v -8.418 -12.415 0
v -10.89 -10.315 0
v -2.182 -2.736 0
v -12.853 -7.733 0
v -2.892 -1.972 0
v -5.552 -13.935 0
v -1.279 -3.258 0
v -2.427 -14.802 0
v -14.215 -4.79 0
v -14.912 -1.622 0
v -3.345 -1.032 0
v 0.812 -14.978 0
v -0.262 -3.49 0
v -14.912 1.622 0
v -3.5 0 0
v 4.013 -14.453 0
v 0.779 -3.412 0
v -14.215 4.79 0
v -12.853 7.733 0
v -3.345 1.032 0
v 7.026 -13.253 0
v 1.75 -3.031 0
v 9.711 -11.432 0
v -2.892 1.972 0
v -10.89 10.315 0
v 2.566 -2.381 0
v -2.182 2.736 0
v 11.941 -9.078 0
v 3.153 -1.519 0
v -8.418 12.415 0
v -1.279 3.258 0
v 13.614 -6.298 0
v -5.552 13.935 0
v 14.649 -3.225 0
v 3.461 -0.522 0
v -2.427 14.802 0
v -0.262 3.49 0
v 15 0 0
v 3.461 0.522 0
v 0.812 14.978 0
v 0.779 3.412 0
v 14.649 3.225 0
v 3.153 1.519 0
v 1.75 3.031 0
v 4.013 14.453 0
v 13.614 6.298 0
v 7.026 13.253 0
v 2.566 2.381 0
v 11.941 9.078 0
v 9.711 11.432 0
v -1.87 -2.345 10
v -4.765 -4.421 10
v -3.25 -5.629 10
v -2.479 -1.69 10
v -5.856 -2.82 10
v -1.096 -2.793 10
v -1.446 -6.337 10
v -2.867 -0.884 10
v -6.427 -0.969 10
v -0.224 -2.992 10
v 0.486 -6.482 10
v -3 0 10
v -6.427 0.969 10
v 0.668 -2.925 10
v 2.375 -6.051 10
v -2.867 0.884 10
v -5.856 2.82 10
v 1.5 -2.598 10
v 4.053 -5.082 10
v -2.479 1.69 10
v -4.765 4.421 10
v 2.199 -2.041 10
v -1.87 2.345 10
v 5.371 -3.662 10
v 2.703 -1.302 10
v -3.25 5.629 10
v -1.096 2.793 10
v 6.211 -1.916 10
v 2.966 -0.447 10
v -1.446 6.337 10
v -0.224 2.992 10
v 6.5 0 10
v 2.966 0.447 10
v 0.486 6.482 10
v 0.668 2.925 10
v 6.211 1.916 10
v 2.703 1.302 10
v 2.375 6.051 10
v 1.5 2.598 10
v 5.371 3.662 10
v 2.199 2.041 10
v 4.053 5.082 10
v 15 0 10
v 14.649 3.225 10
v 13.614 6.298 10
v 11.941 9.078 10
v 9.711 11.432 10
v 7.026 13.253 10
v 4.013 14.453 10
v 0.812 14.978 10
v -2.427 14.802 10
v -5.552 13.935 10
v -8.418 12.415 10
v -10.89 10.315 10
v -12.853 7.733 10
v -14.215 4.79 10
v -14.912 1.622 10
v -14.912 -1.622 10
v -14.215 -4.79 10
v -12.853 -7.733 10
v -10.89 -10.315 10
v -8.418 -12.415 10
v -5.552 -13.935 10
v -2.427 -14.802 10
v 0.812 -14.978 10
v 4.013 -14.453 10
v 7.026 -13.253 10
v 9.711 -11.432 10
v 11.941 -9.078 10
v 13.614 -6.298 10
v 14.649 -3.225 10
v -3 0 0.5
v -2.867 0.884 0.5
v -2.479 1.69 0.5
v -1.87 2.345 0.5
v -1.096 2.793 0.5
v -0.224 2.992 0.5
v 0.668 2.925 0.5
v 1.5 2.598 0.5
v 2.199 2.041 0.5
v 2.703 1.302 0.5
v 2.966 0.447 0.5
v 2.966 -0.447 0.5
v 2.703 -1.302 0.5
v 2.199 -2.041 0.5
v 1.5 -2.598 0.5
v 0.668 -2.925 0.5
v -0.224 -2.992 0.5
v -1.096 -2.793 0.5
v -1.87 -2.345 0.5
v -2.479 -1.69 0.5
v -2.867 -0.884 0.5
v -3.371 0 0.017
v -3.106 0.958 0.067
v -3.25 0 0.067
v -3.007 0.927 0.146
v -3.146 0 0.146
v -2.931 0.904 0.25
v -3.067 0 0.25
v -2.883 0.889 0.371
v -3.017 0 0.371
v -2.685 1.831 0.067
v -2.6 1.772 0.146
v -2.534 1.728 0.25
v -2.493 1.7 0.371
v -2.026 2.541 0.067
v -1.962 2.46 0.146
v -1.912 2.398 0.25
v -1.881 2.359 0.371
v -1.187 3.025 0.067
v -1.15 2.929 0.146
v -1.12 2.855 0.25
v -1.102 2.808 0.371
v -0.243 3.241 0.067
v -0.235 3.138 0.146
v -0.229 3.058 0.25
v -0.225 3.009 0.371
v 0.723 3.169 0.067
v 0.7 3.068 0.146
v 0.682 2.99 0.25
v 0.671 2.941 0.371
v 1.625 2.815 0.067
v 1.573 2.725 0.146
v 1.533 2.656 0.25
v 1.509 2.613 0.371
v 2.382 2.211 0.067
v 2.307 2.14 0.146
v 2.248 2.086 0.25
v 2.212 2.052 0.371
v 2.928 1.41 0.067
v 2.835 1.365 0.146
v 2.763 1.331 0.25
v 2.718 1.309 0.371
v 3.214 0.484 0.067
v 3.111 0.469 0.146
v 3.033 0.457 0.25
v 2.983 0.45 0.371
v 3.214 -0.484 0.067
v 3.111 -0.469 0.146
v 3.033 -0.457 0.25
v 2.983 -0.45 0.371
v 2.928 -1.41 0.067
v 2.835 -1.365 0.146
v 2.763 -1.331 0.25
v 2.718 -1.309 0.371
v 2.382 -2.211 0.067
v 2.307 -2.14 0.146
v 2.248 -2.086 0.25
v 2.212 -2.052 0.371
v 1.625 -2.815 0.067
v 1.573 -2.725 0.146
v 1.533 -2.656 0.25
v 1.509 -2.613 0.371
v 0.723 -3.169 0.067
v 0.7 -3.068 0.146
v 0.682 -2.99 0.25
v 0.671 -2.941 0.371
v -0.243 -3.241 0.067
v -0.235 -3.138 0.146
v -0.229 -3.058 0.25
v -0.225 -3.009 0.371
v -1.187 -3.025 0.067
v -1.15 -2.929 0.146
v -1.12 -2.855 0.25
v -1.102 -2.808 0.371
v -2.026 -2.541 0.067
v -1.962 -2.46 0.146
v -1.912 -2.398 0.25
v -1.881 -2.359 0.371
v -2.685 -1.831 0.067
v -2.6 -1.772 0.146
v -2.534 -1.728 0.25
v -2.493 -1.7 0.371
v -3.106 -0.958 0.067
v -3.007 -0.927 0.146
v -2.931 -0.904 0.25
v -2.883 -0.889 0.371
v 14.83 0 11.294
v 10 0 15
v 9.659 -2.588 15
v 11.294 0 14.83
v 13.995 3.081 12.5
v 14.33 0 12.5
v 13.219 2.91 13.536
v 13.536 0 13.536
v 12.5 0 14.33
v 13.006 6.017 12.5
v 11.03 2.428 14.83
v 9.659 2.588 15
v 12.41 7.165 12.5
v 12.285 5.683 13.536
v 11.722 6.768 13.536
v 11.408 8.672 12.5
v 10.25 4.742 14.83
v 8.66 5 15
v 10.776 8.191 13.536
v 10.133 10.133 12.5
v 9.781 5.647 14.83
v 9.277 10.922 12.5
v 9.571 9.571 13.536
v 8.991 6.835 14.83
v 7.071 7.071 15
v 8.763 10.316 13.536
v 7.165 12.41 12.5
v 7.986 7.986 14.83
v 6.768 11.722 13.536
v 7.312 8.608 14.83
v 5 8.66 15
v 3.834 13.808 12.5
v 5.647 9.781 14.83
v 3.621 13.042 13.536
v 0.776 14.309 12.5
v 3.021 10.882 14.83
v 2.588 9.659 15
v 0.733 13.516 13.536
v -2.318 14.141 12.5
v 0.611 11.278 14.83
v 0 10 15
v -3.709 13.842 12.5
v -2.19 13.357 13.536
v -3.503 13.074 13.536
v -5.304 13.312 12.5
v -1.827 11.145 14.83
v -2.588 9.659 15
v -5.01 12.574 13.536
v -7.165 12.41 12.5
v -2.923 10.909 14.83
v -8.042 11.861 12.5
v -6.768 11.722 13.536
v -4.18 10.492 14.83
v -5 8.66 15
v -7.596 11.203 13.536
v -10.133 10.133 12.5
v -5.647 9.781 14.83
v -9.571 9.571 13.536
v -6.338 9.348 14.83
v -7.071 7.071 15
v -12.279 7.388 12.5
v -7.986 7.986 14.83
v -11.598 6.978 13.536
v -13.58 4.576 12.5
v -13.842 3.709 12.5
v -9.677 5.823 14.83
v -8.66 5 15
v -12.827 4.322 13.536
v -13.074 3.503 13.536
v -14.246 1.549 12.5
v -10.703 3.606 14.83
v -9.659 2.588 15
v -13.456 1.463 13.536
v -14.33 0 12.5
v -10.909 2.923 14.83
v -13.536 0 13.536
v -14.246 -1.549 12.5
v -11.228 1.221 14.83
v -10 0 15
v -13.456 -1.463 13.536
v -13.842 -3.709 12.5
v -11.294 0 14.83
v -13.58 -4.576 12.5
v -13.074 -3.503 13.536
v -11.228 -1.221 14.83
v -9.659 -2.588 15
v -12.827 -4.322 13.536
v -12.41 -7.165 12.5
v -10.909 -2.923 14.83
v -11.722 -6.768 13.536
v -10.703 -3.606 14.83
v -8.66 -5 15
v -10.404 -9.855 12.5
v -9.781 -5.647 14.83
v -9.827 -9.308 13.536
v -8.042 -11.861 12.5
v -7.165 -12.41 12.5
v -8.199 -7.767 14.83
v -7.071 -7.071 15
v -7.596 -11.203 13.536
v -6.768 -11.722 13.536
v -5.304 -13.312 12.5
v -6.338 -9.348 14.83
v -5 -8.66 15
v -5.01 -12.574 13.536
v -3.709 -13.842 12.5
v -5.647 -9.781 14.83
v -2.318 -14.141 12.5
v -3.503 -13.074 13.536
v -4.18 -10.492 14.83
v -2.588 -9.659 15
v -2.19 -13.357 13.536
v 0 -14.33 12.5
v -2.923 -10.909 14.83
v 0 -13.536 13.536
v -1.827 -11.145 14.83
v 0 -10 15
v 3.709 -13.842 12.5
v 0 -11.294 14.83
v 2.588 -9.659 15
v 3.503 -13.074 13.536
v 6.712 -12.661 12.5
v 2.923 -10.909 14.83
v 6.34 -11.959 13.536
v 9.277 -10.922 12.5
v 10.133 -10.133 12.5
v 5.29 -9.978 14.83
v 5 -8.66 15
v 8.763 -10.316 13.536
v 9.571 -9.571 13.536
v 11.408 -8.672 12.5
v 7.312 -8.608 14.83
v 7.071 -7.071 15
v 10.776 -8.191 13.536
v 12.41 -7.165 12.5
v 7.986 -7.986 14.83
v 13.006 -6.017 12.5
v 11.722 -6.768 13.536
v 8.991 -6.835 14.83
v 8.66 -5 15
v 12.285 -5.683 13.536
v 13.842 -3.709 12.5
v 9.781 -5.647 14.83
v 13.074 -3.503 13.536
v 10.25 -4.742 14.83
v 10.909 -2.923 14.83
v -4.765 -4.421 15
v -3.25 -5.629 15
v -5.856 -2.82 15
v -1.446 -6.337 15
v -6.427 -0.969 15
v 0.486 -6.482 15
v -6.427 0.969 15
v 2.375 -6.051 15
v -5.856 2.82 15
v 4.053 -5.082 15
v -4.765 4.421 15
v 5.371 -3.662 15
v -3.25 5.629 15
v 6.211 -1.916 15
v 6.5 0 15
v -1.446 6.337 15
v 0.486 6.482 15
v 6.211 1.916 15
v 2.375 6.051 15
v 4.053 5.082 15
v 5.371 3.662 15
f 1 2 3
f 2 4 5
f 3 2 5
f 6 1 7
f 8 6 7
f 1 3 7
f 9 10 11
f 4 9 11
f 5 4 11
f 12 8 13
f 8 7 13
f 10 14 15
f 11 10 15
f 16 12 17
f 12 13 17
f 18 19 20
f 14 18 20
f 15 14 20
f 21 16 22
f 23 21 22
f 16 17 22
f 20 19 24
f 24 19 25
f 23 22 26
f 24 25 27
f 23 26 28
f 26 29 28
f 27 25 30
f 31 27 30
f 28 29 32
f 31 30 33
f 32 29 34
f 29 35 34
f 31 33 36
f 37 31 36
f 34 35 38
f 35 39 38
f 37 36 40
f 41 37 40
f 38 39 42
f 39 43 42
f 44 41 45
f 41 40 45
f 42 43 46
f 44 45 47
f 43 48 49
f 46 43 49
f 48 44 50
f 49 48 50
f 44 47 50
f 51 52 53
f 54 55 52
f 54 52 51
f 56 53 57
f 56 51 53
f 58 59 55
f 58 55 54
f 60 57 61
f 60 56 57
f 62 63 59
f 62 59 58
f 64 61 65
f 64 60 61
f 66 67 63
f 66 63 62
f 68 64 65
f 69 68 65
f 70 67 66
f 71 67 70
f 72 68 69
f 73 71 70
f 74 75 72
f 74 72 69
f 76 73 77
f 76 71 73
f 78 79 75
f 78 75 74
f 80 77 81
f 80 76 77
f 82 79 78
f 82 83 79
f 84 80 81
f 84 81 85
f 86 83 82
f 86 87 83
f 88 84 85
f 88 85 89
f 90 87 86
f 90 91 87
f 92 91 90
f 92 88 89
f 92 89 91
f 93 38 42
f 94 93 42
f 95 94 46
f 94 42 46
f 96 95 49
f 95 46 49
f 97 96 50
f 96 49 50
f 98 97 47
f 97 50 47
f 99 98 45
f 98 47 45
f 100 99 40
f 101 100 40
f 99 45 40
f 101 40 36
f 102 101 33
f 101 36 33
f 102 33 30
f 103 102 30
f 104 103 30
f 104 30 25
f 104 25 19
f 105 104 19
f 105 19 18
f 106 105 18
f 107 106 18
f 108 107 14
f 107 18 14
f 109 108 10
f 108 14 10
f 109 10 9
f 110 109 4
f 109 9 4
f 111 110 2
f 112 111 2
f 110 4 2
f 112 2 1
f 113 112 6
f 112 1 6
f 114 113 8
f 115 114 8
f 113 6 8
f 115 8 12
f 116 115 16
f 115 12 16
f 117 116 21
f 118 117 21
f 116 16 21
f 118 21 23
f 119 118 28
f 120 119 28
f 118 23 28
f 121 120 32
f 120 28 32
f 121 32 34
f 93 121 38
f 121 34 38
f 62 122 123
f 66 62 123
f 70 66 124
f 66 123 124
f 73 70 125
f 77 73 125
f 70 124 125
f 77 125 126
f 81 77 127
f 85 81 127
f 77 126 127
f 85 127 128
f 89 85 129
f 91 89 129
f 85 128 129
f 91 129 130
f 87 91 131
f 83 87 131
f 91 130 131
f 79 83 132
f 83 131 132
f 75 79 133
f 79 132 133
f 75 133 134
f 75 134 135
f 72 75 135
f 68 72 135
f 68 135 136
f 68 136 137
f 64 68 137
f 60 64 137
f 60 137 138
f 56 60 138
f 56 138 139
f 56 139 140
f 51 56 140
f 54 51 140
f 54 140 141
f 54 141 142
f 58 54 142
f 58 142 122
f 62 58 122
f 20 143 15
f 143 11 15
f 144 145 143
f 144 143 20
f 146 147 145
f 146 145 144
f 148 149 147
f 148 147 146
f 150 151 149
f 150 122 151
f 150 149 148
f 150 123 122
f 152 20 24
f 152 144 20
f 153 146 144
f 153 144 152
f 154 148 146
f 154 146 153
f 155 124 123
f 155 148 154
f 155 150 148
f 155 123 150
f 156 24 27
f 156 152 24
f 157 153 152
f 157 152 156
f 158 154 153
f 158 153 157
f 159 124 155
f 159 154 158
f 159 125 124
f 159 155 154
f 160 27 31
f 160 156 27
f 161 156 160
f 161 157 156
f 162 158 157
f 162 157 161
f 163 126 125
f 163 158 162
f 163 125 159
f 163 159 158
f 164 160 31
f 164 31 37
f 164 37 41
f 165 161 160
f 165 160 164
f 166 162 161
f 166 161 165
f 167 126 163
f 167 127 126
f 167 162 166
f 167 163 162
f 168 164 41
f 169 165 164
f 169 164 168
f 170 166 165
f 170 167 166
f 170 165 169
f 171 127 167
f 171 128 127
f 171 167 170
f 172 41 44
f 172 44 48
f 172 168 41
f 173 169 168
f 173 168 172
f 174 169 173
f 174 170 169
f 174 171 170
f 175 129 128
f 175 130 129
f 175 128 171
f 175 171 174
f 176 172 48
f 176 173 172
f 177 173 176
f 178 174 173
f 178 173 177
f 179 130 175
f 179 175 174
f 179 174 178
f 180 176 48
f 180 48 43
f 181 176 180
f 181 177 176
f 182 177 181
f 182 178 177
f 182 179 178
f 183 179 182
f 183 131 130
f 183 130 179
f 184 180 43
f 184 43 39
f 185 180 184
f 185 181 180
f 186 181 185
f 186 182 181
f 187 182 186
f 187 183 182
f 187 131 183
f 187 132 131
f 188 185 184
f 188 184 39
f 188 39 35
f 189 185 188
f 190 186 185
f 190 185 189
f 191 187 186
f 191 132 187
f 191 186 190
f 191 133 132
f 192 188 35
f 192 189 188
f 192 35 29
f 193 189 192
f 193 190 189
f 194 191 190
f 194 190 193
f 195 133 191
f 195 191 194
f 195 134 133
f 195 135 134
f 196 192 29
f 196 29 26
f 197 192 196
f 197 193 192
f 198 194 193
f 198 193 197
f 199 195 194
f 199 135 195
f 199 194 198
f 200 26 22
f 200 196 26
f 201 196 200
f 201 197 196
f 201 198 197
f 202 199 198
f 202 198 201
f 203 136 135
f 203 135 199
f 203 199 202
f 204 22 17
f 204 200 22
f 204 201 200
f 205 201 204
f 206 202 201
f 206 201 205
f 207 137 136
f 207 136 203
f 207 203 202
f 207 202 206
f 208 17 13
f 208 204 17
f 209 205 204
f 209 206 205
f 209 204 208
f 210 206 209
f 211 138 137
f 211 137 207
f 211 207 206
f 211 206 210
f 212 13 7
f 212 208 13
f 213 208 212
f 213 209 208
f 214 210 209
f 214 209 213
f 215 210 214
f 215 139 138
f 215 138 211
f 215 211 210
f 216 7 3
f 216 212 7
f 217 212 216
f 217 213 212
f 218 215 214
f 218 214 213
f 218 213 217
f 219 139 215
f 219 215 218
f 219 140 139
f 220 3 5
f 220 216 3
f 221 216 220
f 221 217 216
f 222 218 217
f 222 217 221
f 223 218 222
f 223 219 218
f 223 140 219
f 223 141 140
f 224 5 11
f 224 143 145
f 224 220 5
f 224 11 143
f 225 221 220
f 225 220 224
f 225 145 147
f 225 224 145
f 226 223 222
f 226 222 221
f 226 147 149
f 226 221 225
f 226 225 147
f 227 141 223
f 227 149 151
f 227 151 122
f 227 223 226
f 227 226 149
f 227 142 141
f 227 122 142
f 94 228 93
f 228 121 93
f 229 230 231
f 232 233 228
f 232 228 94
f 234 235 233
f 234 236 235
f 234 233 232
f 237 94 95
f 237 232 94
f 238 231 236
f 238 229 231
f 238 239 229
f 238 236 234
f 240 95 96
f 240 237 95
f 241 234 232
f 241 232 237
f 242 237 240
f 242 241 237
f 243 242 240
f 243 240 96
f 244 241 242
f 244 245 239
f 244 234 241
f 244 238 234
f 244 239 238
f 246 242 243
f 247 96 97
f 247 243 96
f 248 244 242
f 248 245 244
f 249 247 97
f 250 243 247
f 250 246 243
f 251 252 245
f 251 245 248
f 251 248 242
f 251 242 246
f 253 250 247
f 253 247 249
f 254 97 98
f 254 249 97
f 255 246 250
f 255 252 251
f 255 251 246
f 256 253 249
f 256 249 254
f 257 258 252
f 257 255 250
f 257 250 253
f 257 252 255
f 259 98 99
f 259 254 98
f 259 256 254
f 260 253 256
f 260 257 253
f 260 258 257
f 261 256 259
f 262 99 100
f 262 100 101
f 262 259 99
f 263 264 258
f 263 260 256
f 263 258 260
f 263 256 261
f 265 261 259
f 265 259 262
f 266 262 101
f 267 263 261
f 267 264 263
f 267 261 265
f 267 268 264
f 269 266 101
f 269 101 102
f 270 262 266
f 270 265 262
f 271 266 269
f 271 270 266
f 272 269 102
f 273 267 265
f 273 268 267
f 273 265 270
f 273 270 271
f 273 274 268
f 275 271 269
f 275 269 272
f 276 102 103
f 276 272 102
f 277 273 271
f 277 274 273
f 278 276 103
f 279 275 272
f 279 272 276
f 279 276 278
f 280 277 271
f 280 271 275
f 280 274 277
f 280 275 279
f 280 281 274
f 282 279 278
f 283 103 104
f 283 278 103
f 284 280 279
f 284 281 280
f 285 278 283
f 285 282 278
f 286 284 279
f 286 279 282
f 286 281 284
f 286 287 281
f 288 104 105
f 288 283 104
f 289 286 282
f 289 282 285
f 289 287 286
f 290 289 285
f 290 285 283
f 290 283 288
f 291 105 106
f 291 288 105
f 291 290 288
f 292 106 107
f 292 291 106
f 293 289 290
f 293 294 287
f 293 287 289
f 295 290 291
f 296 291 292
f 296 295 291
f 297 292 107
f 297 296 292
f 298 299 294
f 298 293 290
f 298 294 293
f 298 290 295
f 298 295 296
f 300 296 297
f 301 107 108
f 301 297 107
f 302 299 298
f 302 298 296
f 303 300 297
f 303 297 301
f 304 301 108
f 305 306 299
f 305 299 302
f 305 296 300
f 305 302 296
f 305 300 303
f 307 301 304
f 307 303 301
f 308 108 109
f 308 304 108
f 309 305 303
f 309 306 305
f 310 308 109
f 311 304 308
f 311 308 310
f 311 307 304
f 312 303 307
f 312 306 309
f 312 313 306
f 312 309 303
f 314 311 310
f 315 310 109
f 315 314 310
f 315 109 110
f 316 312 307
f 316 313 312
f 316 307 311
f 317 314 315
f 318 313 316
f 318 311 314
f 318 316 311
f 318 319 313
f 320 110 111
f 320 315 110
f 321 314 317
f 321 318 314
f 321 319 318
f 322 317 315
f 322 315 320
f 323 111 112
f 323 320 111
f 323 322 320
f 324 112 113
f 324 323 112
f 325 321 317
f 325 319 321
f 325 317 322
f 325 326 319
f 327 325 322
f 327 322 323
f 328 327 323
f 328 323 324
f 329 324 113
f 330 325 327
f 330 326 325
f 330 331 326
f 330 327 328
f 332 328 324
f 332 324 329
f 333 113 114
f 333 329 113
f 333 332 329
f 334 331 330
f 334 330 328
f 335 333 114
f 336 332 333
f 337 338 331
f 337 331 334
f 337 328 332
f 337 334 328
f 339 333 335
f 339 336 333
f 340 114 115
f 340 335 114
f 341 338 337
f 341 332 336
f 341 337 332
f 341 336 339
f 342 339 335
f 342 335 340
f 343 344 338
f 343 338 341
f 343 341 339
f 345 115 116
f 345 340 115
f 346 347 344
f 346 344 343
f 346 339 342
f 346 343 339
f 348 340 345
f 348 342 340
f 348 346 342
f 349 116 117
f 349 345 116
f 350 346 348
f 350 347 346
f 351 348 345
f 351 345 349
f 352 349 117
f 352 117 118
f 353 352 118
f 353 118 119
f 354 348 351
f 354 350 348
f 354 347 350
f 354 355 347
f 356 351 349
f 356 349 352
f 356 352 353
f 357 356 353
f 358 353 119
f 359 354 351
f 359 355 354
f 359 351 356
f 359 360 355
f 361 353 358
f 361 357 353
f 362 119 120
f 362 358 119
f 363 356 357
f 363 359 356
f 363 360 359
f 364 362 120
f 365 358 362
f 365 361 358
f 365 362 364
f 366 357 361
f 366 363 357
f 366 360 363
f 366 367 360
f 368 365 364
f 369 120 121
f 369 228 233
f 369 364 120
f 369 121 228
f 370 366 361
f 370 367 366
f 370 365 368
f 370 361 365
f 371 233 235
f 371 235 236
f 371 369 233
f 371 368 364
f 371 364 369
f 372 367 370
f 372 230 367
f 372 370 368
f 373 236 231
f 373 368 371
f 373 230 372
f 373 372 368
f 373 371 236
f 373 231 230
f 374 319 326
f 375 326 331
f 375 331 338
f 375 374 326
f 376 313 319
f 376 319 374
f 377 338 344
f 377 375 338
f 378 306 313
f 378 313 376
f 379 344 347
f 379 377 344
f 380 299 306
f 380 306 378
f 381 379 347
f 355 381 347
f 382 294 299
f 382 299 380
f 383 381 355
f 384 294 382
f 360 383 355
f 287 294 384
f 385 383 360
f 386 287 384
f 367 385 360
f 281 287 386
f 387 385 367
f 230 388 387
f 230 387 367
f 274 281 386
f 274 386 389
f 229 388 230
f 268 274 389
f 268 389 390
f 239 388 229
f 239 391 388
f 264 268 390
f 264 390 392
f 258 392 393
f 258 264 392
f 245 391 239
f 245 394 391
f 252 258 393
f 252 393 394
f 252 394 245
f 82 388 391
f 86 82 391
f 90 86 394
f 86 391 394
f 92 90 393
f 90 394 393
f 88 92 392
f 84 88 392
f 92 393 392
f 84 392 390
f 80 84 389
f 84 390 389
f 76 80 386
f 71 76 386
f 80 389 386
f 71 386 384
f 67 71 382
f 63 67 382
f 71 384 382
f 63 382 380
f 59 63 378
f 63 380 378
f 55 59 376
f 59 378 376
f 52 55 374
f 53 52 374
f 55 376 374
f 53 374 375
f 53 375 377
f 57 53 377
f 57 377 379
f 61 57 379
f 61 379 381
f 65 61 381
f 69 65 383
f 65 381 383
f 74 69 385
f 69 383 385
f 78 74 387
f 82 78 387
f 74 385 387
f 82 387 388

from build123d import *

# Parameters (mm, degrees)
IZIM1_R                     = 15
Y_KSEKLIK_EKSTR_ZYON1_DEPTH = 15
RADYUS1_R                   = 5
IZIM2_R                     = 3
KES_EKSTR_ZYON1_DEPTH       = 15
IZIM3_R                     = 6.5
KES_EKSTR_ZYON2_DEPTH       = 5
RADYUS2_R                   = 0.5


with BuildPart() as part:
    # Çizim1 → Yükseklik-Ekstrüzyon1 (new body)
    with BuildSketch(Plane.XY):
        Circle(IZIM1_R)
    extrude(amount=Y_KSEKLIK_EKSTR_ZYON1_DEPTH)

    # Radyus1
    radyus1_edges = [part.edges().sort_by_distance(p)[0] for p in [
        (-15, 0, 15),
    ]]
    fillet(radyus1_edges, radius=RADYUS1_R)

    # Çizim2 → Kes-Ekstrüzyon1 (cut)
    with BuildSketch(Plane(origin=(0, 0, 0), x_dir=(-1, 0, 0), z_dir=(0, 0, -1))):
        Circle(IZIM2_R)
    extrude(amount=-KES_EKSTR_ZYON1_DEPTH, mode=Mode.SUBTRACT)

    # Çizim3 → Kes-Ekstrüzyon2 (cut)
    with BuildSketch(Plane.XY.offset(15)):
        Circle(IZIM3_R)
    extrude(amount=-KES_EKSTR_ZYON2_DEPTH, mode=Mode.SUBTRACT)

    # Radyus2
    radyus2_edges = [part.edges().sort_by_distance(p)[0] for p in [
        (3, 0, 0),
    ]]
    fillet(radyus2_edges, radius=RADYUS2_R)


solid = part.part
